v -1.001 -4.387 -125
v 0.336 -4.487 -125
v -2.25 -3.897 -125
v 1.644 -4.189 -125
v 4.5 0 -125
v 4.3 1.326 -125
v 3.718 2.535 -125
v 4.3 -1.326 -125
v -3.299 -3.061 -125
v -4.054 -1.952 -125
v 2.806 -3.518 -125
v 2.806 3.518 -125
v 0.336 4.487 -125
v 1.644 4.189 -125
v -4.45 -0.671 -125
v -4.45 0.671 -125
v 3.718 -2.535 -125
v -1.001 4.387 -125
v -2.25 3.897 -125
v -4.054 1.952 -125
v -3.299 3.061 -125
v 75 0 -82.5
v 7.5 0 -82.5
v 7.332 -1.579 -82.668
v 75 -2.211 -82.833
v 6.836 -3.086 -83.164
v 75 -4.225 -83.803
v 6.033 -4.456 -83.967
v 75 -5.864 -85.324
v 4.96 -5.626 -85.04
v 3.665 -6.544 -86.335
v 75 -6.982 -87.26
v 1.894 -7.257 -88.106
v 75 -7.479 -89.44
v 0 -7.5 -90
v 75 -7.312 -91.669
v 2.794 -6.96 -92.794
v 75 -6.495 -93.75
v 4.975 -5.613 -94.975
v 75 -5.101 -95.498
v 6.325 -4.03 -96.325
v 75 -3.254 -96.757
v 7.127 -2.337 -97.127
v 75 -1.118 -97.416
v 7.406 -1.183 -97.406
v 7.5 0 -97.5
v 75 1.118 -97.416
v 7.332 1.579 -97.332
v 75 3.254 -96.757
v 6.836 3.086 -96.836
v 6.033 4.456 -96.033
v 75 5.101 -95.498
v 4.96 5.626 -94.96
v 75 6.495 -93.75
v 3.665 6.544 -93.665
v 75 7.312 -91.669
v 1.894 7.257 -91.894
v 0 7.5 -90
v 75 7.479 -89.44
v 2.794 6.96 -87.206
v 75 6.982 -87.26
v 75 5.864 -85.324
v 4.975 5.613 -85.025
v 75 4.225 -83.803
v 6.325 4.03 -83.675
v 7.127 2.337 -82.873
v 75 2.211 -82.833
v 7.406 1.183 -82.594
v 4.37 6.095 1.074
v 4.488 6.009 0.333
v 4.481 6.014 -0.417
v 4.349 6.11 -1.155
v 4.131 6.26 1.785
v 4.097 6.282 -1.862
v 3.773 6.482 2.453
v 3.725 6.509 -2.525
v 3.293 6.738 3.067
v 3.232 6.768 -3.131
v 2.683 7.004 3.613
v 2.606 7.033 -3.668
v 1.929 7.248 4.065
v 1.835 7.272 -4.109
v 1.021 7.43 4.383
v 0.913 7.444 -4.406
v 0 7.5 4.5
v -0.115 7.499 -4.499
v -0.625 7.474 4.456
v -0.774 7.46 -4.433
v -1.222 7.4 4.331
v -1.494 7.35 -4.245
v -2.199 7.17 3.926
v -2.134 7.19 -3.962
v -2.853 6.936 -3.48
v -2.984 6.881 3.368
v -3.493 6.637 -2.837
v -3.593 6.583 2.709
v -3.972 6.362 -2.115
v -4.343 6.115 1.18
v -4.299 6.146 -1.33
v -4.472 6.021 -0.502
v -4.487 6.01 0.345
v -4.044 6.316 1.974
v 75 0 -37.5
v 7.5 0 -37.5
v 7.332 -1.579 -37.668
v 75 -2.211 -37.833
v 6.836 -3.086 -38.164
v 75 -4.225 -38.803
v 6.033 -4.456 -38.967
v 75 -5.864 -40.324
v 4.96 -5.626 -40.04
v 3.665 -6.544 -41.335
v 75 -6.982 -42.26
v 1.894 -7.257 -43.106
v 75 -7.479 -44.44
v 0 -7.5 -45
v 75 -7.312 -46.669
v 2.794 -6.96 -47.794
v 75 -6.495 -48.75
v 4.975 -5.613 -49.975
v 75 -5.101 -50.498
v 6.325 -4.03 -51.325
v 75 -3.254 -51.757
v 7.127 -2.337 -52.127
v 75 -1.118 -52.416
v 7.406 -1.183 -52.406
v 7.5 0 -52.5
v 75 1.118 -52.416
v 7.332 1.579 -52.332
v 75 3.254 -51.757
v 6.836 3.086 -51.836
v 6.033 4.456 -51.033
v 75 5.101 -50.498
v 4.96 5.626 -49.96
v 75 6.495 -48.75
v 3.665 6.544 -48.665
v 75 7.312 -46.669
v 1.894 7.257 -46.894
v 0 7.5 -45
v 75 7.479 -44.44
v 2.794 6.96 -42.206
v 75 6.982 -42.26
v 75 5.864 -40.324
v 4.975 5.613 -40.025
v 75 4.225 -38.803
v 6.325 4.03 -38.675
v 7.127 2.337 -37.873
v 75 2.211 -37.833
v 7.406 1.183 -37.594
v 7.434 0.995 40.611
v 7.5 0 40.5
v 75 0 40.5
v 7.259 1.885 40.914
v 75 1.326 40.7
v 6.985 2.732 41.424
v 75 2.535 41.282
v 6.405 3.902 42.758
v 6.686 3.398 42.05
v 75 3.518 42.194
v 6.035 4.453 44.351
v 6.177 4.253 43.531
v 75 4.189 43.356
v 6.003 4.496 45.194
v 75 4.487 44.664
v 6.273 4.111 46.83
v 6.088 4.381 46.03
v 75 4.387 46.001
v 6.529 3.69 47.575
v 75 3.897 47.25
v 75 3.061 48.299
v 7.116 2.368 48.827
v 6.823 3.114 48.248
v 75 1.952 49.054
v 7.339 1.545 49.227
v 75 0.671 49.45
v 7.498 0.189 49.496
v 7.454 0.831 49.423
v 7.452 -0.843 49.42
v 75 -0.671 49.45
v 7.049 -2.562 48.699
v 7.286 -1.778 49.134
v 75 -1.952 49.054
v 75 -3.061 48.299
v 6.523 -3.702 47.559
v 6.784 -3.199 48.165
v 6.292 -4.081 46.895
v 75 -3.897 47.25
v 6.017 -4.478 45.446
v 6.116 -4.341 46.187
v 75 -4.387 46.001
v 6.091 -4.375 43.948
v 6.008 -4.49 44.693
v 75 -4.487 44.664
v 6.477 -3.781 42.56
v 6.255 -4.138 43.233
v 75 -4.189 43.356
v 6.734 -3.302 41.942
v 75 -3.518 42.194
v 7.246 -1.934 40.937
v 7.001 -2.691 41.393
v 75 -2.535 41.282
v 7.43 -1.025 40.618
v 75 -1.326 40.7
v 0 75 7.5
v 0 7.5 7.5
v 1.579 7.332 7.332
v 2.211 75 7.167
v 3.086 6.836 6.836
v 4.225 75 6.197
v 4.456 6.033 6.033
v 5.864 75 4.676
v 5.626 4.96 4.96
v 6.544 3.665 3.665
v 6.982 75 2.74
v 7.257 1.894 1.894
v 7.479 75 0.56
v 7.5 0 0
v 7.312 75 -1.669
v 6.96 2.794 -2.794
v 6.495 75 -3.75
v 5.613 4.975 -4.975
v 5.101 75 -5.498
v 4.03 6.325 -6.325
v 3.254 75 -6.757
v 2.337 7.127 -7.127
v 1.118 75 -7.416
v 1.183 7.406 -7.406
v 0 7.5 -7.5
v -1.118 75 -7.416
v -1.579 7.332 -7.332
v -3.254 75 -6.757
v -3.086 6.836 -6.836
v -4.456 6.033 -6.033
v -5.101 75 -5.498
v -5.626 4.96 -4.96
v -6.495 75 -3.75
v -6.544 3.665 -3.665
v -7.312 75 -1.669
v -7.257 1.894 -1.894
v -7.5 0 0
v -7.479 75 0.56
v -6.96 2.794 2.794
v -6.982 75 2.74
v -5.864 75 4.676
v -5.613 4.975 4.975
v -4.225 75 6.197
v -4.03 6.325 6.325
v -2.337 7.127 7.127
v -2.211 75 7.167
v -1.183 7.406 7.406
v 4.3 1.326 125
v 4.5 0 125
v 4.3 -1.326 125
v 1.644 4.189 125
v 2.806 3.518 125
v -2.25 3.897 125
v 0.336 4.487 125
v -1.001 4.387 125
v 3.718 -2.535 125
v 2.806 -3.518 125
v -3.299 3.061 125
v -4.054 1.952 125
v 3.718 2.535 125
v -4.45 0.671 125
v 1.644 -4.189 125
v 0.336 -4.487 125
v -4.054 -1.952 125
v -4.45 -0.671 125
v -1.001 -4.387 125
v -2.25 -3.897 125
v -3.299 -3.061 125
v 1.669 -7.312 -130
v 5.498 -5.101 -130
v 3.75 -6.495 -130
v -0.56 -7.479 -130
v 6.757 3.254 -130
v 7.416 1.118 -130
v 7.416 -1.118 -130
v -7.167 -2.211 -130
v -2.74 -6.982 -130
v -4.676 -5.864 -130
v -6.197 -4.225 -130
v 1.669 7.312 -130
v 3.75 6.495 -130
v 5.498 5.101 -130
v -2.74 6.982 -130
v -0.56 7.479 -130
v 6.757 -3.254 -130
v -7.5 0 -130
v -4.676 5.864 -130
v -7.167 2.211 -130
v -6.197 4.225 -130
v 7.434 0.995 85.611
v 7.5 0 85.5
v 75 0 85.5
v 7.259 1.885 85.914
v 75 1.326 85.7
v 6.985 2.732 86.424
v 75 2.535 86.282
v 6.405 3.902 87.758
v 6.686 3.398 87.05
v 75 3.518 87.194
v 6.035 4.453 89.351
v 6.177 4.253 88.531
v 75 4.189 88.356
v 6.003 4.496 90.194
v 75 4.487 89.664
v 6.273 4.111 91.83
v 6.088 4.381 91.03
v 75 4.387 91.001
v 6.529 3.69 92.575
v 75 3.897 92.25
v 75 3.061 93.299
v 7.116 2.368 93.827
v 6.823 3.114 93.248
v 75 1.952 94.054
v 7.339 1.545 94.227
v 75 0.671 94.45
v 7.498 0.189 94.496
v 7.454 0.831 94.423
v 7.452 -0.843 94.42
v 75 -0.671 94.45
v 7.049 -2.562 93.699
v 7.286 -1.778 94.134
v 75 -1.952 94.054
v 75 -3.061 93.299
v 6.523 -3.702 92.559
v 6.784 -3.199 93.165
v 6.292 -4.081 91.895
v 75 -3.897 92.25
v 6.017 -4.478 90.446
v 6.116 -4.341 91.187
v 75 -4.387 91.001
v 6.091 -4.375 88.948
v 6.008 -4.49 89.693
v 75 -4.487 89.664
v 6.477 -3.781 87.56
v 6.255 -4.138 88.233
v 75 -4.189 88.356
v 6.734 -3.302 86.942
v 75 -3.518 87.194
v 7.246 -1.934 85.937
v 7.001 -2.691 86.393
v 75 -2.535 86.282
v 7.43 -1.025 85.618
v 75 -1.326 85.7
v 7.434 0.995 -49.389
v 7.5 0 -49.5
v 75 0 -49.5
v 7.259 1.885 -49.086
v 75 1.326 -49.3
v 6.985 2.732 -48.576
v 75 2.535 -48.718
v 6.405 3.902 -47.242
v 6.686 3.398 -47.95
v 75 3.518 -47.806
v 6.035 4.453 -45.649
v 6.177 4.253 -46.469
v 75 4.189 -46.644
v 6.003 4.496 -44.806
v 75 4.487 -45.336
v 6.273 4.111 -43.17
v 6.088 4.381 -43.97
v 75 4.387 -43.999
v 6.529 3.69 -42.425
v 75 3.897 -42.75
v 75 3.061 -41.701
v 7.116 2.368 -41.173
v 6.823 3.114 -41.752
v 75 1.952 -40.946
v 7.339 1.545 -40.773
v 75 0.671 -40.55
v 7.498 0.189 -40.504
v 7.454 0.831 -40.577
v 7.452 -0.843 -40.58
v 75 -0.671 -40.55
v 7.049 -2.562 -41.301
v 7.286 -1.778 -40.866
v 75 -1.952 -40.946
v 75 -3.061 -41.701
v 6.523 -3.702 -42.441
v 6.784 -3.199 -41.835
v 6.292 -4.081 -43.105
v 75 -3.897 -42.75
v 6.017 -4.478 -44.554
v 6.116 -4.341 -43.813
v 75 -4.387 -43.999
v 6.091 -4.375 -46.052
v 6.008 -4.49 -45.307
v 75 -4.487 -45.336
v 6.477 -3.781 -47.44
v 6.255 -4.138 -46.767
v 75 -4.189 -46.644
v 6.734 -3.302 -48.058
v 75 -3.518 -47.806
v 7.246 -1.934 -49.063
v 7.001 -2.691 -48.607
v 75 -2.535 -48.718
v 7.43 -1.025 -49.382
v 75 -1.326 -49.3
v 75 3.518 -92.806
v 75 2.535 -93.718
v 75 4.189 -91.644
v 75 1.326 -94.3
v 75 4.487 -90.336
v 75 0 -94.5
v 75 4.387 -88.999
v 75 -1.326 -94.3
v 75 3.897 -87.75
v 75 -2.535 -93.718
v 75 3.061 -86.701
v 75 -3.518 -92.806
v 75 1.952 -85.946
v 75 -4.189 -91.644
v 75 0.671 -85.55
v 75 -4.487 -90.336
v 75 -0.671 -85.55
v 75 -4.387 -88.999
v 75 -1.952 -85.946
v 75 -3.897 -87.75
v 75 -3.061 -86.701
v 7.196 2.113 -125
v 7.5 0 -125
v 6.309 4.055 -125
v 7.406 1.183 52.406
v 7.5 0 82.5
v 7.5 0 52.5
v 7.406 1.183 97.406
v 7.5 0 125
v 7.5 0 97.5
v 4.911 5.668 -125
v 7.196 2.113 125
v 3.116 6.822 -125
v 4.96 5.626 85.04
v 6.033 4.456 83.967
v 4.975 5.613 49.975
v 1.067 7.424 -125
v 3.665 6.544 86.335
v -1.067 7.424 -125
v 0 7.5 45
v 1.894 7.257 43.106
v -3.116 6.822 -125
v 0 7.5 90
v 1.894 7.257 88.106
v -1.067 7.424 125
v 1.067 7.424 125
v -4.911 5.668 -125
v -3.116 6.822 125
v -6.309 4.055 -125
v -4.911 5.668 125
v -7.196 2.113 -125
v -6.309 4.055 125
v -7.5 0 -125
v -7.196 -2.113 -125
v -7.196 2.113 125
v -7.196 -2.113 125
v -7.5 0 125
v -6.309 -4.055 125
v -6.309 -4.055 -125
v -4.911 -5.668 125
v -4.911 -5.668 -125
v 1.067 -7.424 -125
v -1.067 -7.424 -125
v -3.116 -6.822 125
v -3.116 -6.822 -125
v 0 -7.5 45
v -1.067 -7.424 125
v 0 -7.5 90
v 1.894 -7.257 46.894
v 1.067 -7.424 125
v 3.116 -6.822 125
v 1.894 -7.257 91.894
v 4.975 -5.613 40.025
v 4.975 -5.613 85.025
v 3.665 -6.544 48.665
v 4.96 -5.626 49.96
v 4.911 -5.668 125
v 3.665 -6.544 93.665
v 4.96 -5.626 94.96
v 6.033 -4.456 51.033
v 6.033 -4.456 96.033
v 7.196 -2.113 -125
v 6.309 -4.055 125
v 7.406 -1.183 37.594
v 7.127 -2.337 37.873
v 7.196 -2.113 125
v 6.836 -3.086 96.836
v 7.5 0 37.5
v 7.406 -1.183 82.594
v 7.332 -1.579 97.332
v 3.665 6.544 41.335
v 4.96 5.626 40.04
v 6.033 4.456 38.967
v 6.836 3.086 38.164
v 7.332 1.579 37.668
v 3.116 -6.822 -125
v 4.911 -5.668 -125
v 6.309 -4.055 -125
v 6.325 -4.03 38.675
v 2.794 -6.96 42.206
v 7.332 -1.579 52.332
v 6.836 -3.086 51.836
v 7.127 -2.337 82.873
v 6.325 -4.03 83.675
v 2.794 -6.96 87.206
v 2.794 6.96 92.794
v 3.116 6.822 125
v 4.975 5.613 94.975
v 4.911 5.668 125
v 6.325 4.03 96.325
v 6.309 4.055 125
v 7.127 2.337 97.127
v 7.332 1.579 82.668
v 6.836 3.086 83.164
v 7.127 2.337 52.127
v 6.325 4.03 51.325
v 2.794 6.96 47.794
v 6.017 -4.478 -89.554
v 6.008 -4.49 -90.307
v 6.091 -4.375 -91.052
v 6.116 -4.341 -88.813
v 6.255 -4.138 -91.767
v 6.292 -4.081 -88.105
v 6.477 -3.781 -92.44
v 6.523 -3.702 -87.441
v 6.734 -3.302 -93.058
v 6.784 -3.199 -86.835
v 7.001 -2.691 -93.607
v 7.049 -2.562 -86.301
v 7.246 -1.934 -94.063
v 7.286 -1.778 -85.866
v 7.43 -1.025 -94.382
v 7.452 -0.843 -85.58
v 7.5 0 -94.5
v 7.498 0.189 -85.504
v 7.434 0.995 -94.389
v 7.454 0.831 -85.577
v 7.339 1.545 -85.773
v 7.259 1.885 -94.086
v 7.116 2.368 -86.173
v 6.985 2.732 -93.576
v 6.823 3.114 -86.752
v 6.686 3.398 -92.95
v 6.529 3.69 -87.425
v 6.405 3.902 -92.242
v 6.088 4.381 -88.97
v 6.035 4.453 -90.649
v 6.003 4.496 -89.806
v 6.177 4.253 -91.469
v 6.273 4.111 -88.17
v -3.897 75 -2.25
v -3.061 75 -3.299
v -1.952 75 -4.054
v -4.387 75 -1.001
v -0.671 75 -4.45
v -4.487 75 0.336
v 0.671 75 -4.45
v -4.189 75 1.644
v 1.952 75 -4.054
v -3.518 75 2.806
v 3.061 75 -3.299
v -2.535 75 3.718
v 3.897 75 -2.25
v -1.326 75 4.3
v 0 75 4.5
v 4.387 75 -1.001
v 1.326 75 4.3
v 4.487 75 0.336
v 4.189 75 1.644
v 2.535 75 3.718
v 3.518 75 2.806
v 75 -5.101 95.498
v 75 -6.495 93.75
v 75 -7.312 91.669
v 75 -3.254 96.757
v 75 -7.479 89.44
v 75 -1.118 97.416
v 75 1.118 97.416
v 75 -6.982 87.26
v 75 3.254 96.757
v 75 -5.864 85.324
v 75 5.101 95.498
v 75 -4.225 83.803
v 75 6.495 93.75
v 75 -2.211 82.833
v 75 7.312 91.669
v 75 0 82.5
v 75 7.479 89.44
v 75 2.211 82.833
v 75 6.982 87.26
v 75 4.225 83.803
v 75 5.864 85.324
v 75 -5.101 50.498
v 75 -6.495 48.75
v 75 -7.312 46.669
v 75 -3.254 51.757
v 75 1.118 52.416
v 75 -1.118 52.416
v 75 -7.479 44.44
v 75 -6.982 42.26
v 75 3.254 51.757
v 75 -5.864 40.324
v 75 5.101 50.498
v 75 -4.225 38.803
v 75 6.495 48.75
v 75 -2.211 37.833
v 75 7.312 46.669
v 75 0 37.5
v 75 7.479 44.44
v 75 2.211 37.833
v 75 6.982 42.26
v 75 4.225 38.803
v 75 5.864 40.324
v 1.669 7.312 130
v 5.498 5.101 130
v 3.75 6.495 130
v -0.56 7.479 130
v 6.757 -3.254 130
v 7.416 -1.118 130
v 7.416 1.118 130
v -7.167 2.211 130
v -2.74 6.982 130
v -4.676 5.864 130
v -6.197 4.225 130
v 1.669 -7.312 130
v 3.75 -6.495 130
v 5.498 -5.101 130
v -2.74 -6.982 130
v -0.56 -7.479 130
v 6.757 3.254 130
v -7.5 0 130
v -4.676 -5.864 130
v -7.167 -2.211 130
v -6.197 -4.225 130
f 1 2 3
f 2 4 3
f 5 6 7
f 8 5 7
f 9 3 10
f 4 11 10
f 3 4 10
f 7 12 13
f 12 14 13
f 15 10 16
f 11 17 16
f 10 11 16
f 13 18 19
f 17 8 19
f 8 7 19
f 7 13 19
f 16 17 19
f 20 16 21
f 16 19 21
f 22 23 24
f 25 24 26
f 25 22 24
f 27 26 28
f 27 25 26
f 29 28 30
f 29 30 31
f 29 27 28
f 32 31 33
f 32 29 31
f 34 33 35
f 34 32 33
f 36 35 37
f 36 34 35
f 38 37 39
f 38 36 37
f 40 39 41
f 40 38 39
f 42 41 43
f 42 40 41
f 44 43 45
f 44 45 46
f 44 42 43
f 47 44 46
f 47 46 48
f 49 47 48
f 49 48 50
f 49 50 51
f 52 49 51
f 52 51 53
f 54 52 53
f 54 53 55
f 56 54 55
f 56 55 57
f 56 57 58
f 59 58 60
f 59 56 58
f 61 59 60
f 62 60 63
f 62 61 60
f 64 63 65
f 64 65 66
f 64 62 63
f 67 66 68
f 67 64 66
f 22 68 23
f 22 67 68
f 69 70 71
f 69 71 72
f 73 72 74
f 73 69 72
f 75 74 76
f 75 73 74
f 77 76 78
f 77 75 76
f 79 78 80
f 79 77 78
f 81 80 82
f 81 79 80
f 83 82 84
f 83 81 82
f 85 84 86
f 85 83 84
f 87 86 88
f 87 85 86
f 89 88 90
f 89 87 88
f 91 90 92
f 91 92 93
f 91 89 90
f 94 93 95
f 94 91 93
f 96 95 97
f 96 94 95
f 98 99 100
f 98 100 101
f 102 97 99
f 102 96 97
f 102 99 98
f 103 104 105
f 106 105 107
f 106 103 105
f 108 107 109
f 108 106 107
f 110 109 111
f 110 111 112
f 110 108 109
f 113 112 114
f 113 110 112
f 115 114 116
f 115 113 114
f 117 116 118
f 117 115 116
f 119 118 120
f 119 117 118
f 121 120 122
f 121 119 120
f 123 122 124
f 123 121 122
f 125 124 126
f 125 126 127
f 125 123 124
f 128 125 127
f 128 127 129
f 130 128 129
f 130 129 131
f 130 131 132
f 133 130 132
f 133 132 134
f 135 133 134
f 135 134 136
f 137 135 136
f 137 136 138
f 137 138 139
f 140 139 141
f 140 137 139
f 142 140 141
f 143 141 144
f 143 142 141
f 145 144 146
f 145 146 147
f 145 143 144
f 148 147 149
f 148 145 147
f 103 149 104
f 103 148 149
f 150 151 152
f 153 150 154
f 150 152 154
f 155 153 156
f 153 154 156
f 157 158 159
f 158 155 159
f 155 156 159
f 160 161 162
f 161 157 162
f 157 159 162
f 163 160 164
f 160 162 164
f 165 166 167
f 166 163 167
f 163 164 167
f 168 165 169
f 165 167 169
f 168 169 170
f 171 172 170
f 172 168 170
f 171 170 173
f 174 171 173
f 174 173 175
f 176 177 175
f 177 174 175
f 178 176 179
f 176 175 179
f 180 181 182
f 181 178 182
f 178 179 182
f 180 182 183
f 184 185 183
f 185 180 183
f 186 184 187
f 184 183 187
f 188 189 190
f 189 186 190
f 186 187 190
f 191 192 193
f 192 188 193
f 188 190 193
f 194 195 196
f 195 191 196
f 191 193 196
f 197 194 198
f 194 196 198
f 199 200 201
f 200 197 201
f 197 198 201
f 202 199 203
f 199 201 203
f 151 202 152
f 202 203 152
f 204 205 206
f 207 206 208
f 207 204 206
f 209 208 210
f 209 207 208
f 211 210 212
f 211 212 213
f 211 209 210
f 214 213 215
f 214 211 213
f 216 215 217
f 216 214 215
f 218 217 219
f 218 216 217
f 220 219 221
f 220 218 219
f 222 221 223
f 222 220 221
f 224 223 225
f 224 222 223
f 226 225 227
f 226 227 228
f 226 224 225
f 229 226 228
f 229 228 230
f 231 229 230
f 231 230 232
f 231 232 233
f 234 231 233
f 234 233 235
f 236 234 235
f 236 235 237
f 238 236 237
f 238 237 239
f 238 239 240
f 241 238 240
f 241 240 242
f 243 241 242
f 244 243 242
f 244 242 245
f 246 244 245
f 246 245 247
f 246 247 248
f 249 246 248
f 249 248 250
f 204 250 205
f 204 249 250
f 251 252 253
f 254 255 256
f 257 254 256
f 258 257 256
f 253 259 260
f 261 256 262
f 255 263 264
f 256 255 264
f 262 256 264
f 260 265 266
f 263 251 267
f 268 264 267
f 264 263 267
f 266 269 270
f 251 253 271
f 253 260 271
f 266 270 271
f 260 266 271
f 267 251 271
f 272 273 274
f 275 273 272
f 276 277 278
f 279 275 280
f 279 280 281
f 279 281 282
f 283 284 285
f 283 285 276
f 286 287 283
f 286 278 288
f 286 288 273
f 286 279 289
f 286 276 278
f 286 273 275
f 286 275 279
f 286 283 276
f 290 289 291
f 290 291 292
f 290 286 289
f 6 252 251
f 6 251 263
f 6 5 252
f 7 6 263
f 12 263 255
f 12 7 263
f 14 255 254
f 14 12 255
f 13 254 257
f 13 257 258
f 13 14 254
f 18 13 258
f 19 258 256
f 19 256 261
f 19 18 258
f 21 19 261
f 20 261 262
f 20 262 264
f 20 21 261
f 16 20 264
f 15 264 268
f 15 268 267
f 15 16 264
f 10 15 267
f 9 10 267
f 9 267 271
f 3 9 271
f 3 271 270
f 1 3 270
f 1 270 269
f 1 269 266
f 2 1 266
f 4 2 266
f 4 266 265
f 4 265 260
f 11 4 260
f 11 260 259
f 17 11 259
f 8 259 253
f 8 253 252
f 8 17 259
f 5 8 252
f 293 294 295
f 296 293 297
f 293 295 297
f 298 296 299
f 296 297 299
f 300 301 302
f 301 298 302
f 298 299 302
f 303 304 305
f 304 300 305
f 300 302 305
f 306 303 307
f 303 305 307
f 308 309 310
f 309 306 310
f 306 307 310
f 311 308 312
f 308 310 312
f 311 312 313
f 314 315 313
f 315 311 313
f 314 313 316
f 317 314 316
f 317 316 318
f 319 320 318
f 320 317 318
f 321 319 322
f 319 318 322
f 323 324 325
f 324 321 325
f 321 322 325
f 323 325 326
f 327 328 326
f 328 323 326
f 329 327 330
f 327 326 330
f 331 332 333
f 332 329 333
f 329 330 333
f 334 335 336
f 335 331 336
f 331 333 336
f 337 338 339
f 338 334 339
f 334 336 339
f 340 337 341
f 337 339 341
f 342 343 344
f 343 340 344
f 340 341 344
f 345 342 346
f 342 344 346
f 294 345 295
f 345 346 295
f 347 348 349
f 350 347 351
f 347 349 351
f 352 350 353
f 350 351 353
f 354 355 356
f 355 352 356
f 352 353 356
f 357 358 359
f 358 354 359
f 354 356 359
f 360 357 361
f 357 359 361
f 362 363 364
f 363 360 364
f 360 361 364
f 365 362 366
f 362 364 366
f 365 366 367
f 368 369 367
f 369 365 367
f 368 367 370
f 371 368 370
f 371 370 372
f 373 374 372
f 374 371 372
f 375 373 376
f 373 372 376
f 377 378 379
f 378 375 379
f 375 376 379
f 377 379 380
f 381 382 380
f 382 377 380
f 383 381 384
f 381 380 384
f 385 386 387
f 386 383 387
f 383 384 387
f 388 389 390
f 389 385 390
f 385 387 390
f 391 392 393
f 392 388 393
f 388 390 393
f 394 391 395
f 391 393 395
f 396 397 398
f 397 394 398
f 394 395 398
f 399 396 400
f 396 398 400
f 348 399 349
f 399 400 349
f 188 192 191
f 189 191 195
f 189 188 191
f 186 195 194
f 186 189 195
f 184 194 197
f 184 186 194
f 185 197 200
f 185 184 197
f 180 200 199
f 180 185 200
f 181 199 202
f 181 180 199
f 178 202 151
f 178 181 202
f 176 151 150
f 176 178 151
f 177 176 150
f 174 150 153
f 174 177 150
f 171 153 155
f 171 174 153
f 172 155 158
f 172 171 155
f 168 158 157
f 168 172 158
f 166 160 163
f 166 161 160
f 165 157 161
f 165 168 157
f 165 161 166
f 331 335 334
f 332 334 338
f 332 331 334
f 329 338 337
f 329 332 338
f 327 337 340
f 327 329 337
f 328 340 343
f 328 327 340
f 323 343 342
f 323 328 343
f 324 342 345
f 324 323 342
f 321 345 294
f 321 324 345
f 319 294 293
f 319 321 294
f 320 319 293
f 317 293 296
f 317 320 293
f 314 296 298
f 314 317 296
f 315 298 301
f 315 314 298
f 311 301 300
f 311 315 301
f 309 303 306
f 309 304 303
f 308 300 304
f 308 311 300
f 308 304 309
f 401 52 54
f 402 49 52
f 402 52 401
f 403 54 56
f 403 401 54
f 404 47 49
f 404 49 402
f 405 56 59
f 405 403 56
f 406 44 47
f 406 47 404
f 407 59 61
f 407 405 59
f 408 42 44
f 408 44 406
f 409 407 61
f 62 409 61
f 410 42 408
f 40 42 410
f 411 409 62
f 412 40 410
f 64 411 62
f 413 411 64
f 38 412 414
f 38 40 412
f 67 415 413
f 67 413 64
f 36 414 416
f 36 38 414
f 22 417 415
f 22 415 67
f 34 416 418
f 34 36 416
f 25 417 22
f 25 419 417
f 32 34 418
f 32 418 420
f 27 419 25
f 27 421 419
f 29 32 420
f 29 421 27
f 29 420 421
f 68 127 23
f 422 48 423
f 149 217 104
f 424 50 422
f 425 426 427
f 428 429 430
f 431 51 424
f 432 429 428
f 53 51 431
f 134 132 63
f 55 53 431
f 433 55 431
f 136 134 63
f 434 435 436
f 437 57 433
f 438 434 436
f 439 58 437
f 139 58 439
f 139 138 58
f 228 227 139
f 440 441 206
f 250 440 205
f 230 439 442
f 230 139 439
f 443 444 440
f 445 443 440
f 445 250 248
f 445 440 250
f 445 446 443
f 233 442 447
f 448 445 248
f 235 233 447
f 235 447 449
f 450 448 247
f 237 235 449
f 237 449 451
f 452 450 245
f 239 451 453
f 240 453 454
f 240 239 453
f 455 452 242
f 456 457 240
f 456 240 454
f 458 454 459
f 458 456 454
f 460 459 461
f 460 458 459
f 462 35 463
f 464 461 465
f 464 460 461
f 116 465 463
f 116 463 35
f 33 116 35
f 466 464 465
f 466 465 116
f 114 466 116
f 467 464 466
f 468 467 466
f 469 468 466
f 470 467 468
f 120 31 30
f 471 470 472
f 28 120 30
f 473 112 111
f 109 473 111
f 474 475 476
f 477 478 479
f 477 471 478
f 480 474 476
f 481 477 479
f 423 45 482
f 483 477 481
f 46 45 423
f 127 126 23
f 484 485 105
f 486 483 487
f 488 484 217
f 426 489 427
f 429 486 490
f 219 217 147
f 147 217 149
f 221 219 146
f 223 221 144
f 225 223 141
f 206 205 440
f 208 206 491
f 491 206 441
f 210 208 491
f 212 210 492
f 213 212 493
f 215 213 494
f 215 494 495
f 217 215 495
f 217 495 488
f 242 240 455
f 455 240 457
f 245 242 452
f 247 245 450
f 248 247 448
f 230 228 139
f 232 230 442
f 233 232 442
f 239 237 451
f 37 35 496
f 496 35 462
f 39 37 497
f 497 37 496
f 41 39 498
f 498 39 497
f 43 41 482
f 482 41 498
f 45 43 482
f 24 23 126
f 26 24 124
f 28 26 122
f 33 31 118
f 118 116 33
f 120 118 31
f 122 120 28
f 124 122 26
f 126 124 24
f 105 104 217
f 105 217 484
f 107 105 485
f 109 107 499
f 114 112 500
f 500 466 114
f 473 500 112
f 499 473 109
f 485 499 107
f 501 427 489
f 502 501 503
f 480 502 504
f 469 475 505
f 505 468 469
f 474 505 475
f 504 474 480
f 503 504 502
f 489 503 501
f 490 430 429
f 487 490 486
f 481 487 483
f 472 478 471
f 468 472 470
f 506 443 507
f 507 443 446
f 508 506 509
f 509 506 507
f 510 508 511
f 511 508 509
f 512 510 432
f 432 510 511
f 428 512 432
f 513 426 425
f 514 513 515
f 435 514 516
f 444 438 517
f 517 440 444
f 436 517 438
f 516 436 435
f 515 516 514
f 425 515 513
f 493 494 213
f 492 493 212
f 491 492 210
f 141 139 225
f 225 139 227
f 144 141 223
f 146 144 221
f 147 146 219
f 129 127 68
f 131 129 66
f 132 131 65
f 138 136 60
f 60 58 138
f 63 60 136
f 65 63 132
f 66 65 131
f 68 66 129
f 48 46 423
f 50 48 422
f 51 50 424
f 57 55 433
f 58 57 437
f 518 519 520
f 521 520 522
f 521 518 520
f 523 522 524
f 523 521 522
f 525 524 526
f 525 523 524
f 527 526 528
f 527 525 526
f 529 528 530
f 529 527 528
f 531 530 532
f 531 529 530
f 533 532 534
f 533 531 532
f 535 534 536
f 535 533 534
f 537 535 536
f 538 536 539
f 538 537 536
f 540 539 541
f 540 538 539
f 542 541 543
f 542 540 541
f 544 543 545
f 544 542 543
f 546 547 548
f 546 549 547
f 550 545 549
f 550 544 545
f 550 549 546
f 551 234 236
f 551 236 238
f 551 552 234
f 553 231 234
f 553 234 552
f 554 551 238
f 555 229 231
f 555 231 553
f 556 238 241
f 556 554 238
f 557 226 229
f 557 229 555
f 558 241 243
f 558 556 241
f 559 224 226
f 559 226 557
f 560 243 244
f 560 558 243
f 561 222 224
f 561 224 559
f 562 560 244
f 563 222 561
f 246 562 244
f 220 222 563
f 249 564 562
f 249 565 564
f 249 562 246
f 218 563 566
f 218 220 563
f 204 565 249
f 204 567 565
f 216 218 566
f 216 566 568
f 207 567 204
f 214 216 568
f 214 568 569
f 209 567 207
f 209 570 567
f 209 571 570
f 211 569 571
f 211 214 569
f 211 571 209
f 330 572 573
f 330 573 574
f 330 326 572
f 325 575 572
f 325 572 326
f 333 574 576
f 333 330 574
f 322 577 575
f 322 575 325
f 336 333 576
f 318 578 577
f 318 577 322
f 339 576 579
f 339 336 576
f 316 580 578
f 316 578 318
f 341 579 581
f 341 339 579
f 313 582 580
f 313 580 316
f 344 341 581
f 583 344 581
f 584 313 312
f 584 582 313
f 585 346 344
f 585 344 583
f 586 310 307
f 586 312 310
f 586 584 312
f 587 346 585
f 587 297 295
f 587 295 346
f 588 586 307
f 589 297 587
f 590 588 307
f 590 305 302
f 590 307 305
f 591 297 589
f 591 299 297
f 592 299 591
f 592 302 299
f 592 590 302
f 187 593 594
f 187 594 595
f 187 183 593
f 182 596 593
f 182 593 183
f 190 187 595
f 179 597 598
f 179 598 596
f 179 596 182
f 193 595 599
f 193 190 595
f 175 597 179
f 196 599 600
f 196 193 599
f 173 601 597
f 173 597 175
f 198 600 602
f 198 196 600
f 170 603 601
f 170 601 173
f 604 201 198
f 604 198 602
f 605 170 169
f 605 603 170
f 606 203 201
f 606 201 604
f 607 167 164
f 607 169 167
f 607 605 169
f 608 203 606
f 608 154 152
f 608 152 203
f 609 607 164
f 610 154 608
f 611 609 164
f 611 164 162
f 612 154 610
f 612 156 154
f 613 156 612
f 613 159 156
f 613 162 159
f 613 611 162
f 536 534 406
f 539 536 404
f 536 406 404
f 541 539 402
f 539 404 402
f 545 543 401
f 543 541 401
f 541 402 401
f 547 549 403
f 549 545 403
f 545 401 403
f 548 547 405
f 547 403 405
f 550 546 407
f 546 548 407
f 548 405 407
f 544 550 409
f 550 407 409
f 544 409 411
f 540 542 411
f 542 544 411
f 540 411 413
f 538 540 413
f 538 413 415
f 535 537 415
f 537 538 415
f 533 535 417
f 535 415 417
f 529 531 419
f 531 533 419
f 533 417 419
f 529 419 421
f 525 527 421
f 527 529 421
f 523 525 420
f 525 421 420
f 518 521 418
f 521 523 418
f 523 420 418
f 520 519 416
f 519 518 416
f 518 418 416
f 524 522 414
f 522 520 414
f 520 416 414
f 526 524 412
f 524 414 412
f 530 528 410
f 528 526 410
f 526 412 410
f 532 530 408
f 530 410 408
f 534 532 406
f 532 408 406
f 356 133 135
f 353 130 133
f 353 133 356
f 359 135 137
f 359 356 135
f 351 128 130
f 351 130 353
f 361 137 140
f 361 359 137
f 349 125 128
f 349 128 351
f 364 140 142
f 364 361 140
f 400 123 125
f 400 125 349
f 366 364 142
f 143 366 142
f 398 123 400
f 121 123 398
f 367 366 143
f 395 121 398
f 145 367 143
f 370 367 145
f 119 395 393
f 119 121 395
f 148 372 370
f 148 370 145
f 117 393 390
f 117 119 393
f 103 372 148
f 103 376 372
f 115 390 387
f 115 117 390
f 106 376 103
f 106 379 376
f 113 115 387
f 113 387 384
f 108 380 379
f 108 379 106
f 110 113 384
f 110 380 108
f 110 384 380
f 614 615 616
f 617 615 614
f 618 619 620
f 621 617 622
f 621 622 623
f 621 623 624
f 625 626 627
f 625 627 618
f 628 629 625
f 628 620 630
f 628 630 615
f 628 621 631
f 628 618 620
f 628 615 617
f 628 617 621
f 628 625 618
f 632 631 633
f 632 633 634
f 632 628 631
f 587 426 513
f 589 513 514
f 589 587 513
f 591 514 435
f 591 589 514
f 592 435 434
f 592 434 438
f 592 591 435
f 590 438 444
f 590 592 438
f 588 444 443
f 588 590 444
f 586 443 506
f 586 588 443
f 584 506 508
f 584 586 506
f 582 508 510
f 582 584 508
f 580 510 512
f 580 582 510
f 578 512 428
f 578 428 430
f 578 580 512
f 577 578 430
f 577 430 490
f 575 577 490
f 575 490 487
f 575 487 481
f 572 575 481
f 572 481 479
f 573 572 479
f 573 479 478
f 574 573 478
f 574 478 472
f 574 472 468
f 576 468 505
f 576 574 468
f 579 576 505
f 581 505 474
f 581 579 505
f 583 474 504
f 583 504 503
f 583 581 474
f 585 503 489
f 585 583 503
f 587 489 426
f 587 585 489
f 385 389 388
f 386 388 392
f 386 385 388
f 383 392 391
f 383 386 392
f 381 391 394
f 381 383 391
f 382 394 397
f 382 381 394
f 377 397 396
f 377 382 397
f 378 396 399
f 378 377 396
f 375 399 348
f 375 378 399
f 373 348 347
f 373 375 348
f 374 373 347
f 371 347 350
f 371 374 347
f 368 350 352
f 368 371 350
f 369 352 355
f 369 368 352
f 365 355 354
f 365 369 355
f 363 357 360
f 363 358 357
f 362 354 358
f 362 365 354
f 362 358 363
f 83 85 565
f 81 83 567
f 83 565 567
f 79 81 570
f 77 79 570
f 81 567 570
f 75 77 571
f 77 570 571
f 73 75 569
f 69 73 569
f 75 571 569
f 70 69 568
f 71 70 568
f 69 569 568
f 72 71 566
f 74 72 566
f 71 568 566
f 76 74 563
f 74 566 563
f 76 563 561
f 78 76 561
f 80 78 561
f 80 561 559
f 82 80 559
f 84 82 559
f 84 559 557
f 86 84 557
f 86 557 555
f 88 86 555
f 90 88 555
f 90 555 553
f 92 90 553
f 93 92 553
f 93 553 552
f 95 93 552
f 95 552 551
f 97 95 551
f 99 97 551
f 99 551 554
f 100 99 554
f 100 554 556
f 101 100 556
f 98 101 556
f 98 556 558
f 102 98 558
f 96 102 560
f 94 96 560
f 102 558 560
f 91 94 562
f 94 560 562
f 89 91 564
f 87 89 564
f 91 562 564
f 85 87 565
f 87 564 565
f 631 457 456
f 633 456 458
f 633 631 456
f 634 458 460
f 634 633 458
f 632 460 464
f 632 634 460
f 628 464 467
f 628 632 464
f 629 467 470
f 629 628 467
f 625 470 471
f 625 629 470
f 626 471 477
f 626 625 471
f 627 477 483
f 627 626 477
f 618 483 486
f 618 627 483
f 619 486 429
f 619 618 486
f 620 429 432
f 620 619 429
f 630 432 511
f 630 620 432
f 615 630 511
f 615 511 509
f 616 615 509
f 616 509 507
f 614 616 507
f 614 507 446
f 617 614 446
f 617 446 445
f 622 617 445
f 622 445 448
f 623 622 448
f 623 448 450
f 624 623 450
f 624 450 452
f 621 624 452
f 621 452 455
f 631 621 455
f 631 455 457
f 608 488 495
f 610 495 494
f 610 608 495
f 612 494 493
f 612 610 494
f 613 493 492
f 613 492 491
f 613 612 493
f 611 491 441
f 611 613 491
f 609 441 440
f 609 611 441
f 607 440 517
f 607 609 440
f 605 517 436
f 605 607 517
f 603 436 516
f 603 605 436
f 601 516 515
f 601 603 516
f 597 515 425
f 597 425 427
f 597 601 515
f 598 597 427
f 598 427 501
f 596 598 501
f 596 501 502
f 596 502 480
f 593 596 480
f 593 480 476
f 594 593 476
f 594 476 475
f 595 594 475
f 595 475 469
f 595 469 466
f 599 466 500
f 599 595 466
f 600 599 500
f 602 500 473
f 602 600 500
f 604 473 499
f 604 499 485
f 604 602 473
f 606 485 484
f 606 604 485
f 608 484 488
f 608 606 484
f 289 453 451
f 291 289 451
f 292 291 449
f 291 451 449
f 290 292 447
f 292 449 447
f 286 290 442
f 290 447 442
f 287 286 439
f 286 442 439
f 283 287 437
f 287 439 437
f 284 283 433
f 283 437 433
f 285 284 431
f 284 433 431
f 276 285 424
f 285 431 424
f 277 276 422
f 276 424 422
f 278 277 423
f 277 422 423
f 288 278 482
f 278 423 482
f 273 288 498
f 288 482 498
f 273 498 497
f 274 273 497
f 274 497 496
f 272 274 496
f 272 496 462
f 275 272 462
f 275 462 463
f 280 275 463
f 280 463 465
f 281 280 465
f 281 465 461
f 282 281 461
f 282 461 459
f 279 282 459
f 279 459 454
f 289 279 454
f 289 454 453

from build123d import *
from build123d.topology import SkipClean

# Parameters (mm, degrees)
SKETCH_1_R           = 7.5
SKETCH_1_R_2         = 4.5
EXTRUDE_1_DEPTH      = 125
EXTRUDE_2_REACH      = 151.958
EXTRUDE_2_END_RADIUS = 7.5
SKETCH_2_R           = 7.5
SKETCH_2_R_2         = 4.5
EXTRUDE_3_REACH      = 169.5
EXTRUDE_3_END_RADIUS = 7.5
SKETCH_3_R           = 7.5
SKETCH_3_R_2         = 4.5
SKETCH_4_R           = 7.5
EXTRUDE_4_DEPTH      = 5
EXTRUDE_START        = 5
SKETCH_5_R           = 7.5
EXTRUDE_5_DEPTH      = 5


with BuildPart() as part:
    # 草图1 → 凸台-拉伸1 (new, symmetric)
    with BuildSketch(Plane.XY):
        Circle(SKETCH_1_R)
        Circle(SKETCH_1_R_2, mode=Mode.SUBTRACT)
    extrude(amount=EXTRUDE_1_DEPTH, both=True)

    # 凸台-拉伸2: up to this cylinder (the profile starts outside it)
    extrude_2_end = Plane(origin=(0, 0, -7.287868), z_dir=(0, 0, -1)) * Cylinder(EXTRUDE_2_END_RADIUS, 319.916, mode=Mode.PRIVATE)
    # 草图2 → 凸台-拉伸2 (add, up to the surface)
    with BuildSketch(Plane(origin=(0, 75, 0), x_dir=(1, 0, 0), z_dir=(0, 1, 0)), mode=Mode.PRIVATE) as extrude_2_sk1:
        with Locations(Location((0, 0, 0), (0, 0, 270))):
            Circle(SKETCH_2_R)
        with Locations(Location((0, 0, 0), (0, 0, 270))):
            Circle(SKETCH_2_R_2, mode=Mode.SUBTRACT)
    extrude_2_tool1 = extrude(extrude_2_sk1.sketch, amount=-EXTRUDE_2_REACH, mode=Mode.PRIVATE) - extrude_2_end
    add(extrude_2_tool1.solids().sort_by_distance((0, 75, -7.287868))[0])

    # 凸台-拉伸3: up to this cylinder (the profile starts outside it)
    extrude_3_end = Plane(origin=(0, 0, 0), z_dir=(0, 0, -1)) * Cylinder(EXTRUDE_3_END_RADIUS, 549.575736, mode=Mode.PRIVATE)
    # 草图3 → 凸台-拉伸3 (add, up to the surface)
    with BuildSketch(Plane(origin=(75, 0, 0), x_dir=(0, 0, -1), z_dir=(1, 0, 0)), mode=Mode.PRIVATE) as extrude_3_sk1:
        with Locations((-45, 0)):
            Circle(SKETCH_3_R)
        with Locations((-45, 0)):
            Circle(SKETCH_3_R_2, mode=Mode.SUBTRACT)
    extrude_3_tool1 = extrude(extrude_3_sk1.sketch, amount=-EXTRUDE_3_REACH, mode=Mode.PRIVATE) - extrude_3_end
    add(extrude_3_tool1.solids().sort_by_distance((75, 0, 52.287868))[0])
    # 草图3 → 凸台-拉伸3 (add, up to the surface)
    with BuildSketch(Plane(origin=(75, 0, 0), x_dir=(0, 0, -1), z_dir=(1, 0, 0)), mode=Mode.PRIVATE) as extrude_3_sk2:
        with Locations((-90, 0)):
            Circle(SKETCH_3_R)
        with Locations((-90, 0)):
            Circle(SKETCH_3_R_2, mode=Mode.SUBTRACT)
    extrude_3_tool2 = extrude(extrude_3_sk2.sketch, amount=-EXTRUDE_3_REACH, mode=Mode.PRIVATE) - extrude_3_end
    add(extrude_3_tool2.solids().sort_by_distance((75, 0, 97.287868))[0])
    # 草图3 → 凸台-拉伸3 (add, up to the surface)
    with BuildSketch(Plane(origin=(75, 0, 0), x_dir=(0, 0, -1), z_dir=(1, 0, 0)), mode=Mode.PRIVATE) as extrude_3_sk3:
        with Locations(Location((90, 0, 0), (0, 0, 180))):
            Circle(SKETCH_3_R)
        with Locations((90, 0)):
            Circle(SKETCH_3_R_2, mode=Mode.SUBTRACT)
    extrude_3_tool3 = extrude(extrude_3_sk3.sketch, amount=-EXTRUDE_3_REACH, mode=Mode.PRIVATE) - extrude_3_end
    add(extrude_3_tool3.solids().sort_by_distance((75, 0, -97.287868))[0])
    # 草图3 → 凸台-拉伸3 (add, up to the surface)
    with BuildSketch(Plane(origin=(75, 0, 0), x_dir=(0, 0, -1), z_dir=(1, 0, 0)), mode=Mode.PRIVATE) as extrude_3_sk4:
        with Locations(Location((45, 0, 0), (0, 0, 180))):
            Circle(SKETCH_3_R)
        with Locations((45, 0)):
            Circle(SKETCH_3_R_2, mode=Mode.SUBTRACT)
    extrude_3_tool4 = extrude(extrude_3_sk4.sketch, amount=-EXTRUDE_3_REACH, mode=Mode.PRIVATE) - extrude_3_end
    add(extrude_3_tool4.solids().sort_by_distance((75, 0, -52.287868))[0])

    # 草图4 → 凸台-拉伸4 (add)
    with SkipClean():  # the faces are left unmerged after this step: merging them gives an invalid solid
        with BuildSketch(Plane(origin=(0, 0, -125), x_dir=(-1, 0, 0), z_dir=(0, 0, -1))):
            Circle(SKETCH_4_R)
        extrude(amount=EXTRUDE_4_DEPTH)

    # 草图5 → 凸台-拉伸5 (add)
    with SkipClean():  # the faces are left unmerged after this step: merging them gives an invalid solid
        with BuildSketch(Plane.XY.offset(125).offset(EXTRUDE_START)):
            with Locations(Location((0, 0, 0), (0, 0, 180))):
                Circle(SKETCH_5_R)
        extrude(amount=-EXTRUDE_5_DEPTH)


solid = part.part
